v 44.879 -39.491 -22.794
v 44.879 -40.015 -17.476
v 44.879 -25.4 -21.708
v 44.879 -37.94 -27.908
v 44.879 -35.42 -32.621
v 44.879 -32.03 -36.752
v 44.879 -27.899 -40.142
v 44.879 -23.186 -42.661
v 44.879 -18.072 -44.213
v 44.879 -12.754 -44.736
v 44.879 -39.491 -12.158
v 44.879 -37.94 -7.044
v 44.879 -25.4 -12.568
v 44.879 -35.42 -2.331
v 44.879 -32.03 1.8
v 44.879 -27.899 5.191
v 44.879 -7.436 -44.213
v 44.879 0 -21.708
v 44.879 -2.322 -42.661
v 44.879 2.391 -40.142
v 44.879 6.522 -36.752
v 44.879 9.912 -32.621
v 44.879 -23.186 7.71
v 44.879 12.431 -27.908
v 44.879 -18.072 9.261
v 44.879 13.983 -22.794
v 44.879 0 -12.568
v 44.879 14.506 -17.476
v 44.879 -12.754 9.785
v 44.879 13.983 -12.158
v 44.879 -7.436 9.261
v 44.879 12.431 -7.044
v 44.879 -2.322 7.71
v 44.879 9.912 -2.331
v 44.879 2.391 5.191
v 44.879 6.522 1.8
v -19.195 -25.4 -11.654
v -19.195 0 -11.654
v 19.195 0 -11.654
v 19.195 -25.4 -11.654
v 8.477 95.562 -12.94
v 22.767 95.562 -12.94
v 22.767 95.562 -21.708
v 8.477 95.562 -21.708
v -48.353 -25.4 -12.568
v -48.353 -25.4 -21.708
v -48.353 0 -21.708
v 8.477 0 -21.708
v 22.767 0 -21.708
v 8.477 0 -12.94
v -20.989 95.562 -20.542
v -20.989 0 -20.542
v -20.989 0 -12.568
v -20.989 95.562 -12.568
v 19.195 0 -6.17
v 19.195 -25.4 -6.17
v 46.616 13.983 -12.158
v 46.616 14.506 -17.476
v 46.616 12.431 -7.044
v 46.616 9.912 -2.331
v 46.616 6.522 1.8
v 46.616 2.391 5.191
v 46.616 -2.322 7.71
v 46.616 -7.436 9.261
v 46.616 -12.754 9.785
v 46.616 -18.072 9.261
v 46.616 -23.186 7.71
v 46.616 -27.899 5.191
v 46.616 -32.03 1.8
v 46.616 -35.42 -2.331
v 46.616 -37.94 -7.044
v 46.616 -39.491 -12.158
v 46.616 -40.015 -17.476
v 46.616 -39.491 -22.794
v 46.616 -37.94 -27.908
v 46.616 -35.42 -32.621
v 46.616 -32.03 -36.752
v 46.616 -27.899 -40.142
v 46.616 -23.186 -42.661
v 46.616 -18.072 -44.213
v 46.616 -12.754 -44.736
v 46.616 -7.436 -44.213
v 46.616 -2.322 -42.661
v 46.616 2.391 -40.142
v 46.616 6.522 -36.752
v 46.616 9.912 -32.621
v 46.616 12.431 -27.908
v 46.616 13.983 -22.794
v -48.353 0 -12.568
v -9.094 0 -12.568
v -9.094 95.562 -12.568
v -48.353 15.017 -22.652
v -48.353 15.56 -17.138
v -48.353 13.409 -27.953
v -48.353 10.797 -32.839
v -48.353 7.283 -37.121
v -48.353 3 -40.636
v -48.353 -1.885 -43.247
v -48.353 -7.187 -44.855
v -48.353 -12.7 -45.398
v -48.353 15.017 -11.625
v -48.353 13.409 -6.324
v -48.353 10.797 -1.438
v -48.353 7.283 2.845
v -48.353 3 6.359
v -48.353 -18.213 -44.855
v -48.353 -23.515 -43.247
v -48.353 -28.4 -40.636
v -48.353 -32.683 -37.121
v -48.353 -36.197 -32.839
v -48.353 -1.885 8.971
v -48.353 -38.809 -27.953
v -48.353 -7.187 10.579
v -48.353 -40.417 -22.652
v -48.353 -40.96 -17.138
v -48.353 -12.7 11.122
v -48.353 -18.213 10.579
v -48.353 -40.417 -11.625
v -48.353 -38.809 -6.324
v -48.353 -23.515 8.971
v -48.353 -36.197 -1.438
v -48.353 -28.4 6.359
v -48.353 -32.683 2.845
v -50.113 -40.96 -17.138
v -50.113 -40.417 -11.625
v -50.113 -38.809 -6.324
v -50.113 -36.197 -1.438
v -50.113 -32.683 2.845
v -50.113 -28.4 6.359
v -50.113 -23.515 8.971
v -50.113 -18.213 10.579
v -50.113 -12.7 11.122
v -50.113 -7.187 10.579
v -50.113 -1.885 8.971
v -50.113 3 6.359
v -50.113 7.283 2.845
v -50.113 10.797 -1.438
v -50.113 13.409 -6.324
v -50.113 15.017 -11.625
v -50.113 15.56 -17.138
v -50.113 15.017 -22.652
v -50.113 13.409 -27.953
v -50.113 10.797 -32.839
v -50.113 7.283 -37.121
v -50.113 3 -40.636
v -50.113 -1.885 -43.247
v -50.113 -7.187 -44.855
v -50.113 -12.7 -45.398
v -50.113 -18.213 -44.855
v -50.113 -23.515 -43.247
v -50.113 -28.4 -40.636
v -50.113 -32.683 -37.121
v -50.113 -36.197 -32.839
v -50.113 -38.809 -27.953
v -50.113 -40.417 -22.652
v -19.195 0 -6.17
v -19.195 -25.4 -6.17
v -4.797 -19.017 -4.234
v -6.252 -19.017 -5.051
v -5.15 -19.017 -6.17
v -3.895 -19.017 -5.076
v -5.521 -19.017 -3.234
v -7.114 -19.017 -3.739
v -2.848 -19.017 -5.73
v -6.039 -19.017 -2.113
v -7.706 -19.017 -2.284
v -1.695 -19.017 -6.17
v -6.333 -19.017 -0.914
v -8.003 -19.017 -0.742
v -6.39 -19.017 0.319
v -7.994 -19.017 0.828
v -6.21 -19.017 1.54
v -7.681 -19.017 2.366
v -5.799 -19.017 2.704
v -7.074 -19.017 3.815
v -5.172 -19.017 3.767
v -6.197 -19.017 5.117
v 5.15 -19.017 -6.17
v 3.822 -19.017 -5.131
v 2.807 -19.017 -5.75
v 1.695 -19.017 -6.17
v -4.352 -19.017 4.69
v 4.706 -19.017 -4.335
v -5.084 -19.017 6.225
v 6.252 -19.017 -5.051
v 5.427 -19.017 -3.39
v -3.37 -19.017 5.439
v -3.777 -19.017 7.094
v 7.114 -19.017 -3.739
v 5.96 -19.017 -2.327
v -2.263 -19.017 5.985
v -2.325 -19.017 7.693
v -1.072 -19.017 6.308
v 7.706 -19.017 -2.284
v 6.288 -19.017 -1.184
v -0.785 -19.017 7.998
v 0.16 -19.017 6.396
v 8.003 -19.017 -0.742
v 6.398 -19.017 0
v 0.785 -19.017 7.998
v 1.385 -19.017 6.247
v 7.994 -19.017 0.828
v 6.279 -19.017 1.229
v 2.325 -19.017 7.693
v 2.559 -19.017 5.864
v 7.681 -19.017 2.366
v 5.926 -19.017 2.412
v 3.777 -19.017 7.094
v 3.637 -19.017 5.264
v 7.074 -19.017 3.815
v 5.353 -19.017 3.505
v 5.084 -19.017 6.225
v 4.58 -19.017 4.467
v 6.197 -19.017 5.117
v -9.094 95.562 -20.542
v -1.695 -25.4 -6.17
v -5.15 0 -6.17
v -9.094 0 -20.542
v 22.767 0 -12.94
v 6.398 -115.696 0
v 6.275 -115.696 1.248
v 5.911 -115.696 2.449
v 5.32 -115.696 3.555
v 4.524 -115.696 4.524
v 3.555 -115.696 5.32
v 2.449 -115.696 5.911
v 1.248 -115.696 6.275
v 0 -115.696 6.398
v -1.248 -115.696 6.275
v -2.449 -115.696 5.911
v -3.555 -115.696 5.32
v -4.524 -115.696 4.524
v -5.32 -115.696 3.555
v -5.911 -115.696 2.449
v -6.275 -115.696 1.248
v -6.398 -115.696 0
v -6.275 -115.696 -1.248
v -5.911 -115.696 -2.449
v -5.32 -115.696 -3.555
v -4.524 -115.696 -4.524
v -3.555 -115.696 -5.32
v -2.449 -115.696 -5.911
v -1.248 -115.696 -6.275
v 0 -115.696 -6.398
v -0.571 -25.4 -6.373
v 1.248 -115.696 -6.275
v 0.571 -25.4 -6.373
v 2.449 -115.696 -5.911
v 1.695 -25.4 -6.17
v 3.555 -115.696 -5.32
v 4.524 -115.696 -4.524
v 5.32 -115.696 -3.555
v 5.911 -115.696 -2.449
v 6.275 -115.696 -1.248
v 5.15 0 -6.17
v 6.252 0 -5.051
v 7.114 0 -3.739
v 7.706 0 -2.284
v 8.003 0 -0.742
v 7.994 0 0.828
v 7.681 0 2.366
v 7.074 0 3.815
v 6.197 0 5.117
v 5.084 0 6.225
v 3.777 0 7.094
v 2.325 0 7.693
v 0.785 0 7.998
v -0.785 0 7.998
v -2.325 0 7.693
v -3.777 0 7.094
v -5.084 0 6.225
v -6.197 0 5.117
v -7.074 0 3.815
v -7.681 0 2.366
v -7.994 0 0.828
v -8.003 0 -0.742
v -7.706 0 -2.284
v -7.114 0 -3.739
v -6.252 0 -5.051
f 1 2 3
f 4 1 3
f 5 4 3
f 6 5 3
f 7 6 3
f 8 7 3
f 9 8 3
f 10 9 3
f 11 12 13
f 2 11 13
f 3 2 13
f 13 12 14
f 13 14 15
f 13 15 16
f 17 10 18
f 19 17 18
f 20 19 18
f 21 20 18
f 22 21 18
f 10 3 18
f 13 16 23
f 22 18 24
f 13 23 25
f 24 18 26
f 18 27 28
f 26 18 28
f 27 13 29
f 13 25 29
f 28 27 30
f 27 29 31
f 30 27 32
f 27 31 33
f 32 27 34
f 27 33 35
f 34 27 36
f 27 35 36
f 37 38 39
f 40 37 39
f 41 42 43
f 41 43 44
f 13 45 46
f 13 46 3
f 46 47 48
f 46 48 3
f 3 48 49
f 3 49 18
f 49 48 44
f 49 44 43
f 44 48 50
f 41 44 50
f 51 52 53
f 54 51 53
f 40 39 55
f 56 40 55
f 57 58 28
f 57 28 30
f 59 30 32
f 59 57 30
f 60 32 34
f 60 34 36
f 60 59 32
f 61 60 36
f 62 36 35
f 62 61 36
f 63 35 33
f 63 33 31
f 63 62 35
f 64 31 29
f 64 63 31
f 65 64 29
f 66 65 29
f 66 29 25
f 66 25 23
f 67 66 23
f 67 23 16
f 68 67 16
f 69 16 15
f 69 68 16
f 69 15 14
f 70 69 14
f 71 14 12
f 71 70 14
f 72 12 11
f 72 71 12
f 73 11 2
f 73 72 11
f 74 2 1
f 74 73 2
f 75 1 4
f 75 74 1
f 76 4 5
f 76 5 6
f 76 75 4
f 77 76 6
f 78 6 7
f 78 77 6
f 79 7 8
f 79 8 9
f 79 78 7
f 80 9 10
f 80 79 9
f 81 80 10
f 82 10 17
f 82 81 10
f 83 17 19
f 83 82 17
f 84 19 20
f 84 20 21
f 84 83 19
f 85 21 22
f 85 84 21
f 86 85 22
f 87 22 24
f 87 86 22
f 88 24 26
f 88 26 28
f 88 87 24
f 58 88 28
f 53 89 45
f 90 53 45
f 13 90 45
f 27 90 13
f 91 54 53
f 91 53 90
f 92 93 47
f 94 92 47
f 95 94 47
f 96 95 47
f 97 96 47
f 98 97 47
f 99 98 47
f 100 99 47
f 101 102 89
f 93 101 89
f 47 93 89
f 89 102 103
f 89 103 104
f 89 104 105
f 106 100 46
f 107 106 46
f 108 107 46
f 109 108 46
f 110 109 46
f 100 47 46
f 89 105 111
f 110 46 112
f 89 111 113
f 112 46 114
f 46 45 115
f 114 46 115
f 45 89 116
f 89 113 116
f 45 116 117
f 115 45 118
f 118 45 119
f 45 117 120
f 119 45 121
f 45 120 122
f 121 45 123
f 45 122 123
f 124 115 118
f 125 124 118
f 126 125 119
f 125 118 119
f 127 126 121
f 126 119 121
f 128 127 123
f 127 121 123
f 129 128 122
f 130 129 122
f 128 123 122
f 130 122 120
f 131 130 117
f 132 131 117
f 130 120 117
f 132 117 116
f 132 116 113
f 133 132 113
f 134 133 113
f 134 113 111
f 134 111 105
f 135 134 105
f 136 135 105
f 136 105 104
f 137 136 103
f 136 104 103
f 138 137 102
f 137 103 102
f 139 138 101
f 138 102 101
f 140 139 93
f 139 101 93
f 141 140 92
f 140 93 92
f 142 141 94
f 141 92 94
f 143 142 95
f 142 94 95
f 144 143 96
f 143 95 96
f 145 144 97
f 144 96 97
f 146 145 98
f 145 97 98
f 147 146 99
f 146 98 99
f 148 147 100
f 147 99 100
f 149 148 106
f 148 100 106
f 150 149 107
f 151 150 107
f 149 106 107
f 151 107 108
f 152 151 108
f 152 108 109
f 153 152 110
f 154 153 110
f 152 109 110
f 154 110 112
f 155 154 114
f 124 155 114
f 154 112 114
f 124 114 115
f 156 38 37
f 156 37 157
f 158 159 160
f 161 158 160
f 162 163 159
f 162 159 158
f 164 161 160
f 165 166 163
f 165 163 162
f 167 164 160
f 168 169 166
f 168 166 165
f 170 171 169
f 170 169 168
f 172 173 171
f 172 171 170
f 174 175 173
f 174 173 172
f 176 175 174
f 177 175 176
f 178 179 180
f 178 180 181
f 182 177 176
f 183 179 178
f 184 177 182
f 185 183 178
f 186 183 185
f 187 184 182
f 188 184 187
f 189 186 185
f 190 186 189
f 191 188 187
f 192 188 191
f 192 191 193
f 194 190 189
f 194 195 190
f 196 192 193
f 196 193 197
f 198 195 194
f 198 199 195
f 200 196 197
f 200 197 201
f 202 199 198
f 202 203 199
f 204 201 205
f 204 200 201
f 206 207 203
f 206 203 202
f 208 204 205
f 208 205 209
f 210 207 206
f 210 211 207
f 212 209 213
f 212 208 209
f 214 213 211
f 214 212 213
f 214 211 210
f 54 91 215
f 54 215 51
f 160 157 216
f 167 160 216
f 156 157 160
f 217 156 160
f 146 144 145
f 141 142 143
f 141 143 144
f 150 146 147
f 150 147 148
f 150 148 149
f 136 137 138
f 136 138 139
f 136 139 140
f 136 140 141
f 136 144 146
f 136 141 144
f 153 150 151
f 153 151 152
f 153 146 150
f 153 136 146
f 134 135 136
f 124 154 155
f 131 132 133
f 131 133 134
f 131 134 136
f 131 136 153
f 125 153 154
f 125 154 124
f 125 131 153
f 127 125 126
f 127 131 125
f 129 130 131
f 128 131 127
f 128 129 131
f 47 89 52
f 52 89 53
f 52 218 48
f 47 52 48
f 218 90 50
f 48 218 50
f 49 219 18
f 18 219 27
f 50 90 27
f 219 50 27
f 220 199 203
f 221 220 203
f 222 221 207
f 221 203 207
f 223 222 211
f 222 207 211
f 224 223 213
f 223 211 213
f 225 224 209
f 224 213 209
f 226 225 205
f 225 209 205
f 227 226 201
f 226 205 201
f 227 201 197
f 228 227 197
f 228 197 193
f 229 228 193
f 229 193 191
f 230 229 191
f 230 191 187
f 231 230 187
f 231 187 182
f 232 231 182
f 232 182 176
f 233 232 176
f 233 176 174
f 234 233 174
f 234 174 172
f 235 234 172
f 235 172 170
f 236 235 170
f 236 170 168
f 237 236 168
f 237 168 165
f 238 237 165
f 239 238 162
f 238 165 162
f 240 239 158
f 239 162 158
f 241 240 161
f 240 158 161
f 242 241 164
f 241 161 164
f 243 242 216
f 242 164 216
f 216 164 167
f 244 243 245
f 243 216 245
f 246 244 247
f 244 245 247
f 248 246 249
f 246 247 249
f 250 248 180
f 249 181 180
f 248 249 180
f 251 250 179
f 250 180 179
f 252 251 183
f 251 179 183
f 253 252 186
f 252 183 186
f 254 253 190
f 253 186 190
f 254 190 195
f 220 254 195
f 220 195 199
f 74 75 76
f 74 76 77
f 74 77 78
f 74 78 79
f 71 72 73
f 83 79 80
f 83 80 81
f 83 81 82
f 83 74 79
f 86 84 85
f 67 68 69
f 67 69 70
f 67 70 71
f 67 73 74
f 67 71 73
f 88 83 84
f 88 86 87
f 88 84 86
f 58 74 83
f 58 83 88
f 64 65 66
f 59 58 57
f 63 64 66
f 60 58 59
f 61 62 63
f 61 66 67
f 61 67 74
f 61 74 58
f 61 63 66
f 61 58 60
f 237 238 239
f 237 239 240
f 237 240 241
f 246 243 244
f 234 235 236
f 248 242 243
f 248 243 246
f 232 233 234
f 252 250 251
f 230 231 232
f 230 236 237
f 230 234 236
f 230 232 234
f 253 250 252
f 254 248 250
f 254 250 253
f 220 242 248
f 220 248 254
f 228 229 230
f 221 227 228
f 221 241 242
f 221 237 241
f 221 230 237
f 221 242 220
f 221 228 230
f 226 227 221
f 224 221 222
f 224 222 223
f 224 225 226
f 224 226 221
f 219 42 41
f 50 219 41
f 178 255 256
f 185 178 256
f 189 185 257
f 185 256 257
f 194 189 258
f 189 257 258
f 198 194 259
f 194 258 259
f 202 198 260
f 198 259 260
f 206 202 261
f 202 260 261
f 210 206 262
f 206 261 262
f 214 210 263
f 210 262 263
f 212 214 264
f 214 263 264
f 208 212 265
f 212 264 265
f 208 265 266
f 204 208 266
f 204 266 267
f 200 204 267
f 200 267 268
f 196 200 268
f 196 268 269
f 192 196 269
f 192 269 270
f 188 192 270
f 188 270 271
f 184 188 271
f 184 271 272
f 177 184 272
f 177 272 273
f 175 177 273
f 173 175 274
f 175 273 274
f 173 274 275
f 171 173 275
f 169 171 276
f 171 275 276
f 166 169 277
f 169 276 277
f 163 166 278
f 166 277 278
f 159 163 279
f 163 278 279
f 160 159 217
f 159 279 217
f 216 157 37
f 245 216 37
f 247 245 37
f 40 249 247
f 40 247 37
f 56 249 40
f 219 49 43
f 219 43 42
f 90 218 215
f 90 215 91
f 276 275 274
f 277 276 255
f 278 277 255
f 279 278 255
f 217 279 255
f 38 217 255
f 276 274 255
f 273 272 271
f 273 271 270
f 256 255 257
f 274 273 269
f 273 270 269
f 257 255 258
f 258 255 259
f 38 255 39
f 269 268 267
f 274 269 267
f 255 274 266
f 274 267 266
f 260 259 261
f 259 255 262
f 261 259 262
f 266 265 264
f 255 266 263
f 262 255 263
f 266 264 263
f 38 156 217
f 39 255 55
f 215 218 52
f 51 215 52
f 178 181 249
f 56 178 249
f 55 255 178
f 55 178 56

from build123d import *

# Parameters (mm, degrees)
F0_R       = 6.3982496495
F1_DEPTH   = 115.696169436
F2_W       = 38.3896529675
F2_H       = 5.4842233658
F3_DEPTH   = 25.4
F4_R       = 8.0369211596
F5_DEPTH   = 19.01746355
F6_W       = 93.2320058346
F6_H       = 9.1404020786
F7_DEPTH   = 25.4
F8_R       = 27.2605842684
F7_FACE1_W = 25.4
F7_FACE1_H = 9.1404020786
F9_DEPTH   = 1.7373869196
F10_R      = 28.2601456602
F11_DEPTH  = 1.7592711374
F12_W      = 11.894620955
F12_H      = 7.9743340611
F12_W_2    = 14.2896864563
F12_H_2    = 8.7689161301
F13_DEPTH  = 95.5624356866


with BuildPart() as f1:
    # F0 (on Front) → F1 (new body)
    with BuildSketch(Plane.XZ):
        Circle(F0_R)
    extrude(amount=F1_DEPTH)

    # F2 (on Front) → F3 (join)
    with BuildSketch(Plane.XZ):
        with Locations((0, -8.9118797332)):
            Rectangle(F2_W, F2_H)
    extrude(amount=F3_DEPTH)

    # F4 (on Front) → F5 (join)
    with BuildSketch(Plane.XZ):
        Circle(F4_R)
    extrude(amount=F5_DEPTH)


with BuildPart() as f7:
    # F6 (on Front) → F7 (new body)
    with BuildSketch(Plane.XZ):
        with Locations((0, -17.138229683)):
            Rectangle(F6_W, F6_H)
    extrude(amount=F7_DEPTH)

    # F8 (on face) + F7_face1 (on face) → F9 (join)
    with BuildSketch(Plane.YZ.offset(46.6160029173)):
        with Locations((-12.7541217953, -17.4758378416)):
            Circle(F8_R)
    with BuildSketch(Plane(origin=(-46.6160029173, -12.7, -17.138229683), x_dir=(0, -1, 0), z_dir=(-1, 0, 0))):
        Rectangle(F7_FACE1_W, F7_FACE1_H)
    extrude(amount=-F9_DEPTH, dir=(1, 0, 0))

    # F10 (on face) → F11 (join)
    with BuildSketch(Plane(origin=(-48.3533898368, 0, 0), x_dir=(0, -1, 0), z_dir=(-1, 0, 0))):
        with Locations((12.7, -17.138229683)):
            Circle(F10_R)
    extrude(amount=F11_DEPTH)

    # F12 (on face) → F13 (join)
    with BuildSketch(Plane(origin=(0, 0, 0), x_dir=(-1, 0, 0), z_dir=(0, 1, 0))):
        with Locations((15.0415115058, -16.5551956743)):
            Rectangle(F12_W, F12_H)
        with Locations((-15.6222125515, -17.3239726573)):
            Rectangle(F12_W_2, F12_H_2)
    extrude(amount=F13_DEPTH)


solid = Compound([f1.part, f7.part])
